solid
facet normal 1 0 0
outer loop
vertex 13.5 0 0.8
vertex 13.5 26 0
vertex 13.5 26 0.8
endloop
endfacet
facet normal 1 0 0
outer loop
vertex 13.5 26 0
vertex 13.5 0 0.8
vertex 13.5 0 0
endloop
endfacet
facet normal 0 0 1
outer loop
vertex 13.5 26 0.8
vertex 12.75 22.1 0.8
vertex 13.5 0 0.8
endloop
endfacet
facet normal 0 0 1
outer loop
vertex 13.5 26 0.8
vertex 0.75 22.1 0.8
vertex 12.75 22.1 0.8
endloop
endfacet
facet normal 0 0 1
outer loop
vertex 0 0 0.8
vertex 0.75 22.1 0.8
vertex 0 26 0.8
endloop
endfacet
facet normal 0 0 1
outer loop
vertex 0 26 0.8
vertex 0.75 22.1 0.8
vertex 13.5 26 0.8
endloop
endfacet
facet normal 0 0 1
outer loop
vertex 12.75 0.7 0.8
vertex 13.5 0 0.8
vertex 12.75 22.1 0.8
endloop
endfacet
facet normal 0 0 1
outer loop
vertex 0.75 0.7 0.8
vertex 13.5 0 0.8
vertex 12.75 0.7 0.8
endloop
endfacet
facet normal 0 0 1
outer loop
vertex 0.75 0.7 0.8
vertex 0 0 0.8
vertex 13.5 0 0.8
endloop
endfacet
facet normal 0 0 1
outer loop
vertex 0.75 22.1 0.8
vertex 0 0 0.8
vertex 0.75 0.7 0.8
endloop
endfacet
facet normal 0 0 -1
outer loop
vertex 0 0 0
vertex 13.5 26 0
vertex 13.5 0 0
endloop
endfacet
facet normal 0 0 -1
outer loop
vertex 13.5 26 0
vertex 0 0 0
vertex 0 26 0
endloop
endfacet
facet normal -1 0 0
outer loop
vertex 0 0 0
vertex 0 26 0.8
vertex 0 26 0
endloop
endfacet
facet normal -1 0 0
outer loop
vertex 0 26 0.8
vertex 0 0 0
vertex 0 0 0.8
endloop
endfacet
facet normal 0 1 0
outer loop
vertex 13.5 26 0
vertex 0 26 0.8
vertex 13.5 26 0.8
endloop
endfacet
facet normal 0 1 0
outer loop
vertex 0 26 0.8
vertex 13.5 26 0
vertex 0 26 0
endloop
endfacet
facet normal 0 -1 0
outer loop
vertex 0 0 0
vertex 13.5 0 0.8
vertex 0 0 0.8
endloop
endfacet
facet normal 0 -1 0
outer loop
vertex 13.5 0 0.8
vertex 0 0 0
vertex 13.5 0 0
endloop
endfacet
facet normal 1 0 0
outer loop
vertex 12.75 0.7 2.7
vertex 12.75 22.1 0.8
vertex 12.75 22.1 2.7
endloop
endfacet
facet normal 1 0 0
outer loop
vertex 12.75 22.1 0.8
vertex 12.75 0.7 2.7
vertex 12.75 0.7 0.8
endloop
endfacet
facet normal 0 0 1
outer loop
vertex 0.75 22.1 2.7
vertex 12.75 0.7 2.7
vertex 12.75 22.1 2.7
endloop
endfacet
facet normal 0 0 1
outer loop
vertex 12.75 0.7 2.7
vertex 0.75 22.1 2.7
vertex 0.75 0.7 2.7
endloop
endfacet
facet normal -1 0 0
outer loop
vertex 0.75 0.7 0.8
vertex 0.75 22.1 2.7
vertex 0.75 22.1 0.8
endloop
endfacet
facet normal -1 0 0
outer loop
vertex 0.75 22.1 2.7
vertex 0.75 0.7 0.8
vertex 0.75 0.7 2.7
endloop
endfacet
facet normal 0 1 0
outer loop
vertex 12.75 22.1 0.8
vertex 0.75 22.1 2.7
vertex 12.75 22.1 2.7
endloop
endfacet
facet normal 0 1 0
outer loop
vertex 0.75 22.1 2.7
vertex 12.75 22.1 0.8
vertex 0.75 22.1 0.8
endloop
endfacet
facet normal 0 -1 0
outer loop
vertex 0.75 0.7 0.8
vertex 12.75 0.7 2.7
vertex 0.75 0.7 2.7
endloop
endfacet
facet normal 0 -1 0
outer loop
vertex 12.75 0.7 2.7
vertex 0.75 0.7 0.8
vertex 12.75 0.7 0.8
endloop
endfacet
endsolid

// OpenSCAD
module rn52() {
  color("blue") {
    cube([13.5, 26.0, 0.8]);
  }
  color("white") {
    translate([0.75, 0.7, 0.8]){
      cube([12.0, 21.4, 1.9]);
    }
  }
}
rn52();
